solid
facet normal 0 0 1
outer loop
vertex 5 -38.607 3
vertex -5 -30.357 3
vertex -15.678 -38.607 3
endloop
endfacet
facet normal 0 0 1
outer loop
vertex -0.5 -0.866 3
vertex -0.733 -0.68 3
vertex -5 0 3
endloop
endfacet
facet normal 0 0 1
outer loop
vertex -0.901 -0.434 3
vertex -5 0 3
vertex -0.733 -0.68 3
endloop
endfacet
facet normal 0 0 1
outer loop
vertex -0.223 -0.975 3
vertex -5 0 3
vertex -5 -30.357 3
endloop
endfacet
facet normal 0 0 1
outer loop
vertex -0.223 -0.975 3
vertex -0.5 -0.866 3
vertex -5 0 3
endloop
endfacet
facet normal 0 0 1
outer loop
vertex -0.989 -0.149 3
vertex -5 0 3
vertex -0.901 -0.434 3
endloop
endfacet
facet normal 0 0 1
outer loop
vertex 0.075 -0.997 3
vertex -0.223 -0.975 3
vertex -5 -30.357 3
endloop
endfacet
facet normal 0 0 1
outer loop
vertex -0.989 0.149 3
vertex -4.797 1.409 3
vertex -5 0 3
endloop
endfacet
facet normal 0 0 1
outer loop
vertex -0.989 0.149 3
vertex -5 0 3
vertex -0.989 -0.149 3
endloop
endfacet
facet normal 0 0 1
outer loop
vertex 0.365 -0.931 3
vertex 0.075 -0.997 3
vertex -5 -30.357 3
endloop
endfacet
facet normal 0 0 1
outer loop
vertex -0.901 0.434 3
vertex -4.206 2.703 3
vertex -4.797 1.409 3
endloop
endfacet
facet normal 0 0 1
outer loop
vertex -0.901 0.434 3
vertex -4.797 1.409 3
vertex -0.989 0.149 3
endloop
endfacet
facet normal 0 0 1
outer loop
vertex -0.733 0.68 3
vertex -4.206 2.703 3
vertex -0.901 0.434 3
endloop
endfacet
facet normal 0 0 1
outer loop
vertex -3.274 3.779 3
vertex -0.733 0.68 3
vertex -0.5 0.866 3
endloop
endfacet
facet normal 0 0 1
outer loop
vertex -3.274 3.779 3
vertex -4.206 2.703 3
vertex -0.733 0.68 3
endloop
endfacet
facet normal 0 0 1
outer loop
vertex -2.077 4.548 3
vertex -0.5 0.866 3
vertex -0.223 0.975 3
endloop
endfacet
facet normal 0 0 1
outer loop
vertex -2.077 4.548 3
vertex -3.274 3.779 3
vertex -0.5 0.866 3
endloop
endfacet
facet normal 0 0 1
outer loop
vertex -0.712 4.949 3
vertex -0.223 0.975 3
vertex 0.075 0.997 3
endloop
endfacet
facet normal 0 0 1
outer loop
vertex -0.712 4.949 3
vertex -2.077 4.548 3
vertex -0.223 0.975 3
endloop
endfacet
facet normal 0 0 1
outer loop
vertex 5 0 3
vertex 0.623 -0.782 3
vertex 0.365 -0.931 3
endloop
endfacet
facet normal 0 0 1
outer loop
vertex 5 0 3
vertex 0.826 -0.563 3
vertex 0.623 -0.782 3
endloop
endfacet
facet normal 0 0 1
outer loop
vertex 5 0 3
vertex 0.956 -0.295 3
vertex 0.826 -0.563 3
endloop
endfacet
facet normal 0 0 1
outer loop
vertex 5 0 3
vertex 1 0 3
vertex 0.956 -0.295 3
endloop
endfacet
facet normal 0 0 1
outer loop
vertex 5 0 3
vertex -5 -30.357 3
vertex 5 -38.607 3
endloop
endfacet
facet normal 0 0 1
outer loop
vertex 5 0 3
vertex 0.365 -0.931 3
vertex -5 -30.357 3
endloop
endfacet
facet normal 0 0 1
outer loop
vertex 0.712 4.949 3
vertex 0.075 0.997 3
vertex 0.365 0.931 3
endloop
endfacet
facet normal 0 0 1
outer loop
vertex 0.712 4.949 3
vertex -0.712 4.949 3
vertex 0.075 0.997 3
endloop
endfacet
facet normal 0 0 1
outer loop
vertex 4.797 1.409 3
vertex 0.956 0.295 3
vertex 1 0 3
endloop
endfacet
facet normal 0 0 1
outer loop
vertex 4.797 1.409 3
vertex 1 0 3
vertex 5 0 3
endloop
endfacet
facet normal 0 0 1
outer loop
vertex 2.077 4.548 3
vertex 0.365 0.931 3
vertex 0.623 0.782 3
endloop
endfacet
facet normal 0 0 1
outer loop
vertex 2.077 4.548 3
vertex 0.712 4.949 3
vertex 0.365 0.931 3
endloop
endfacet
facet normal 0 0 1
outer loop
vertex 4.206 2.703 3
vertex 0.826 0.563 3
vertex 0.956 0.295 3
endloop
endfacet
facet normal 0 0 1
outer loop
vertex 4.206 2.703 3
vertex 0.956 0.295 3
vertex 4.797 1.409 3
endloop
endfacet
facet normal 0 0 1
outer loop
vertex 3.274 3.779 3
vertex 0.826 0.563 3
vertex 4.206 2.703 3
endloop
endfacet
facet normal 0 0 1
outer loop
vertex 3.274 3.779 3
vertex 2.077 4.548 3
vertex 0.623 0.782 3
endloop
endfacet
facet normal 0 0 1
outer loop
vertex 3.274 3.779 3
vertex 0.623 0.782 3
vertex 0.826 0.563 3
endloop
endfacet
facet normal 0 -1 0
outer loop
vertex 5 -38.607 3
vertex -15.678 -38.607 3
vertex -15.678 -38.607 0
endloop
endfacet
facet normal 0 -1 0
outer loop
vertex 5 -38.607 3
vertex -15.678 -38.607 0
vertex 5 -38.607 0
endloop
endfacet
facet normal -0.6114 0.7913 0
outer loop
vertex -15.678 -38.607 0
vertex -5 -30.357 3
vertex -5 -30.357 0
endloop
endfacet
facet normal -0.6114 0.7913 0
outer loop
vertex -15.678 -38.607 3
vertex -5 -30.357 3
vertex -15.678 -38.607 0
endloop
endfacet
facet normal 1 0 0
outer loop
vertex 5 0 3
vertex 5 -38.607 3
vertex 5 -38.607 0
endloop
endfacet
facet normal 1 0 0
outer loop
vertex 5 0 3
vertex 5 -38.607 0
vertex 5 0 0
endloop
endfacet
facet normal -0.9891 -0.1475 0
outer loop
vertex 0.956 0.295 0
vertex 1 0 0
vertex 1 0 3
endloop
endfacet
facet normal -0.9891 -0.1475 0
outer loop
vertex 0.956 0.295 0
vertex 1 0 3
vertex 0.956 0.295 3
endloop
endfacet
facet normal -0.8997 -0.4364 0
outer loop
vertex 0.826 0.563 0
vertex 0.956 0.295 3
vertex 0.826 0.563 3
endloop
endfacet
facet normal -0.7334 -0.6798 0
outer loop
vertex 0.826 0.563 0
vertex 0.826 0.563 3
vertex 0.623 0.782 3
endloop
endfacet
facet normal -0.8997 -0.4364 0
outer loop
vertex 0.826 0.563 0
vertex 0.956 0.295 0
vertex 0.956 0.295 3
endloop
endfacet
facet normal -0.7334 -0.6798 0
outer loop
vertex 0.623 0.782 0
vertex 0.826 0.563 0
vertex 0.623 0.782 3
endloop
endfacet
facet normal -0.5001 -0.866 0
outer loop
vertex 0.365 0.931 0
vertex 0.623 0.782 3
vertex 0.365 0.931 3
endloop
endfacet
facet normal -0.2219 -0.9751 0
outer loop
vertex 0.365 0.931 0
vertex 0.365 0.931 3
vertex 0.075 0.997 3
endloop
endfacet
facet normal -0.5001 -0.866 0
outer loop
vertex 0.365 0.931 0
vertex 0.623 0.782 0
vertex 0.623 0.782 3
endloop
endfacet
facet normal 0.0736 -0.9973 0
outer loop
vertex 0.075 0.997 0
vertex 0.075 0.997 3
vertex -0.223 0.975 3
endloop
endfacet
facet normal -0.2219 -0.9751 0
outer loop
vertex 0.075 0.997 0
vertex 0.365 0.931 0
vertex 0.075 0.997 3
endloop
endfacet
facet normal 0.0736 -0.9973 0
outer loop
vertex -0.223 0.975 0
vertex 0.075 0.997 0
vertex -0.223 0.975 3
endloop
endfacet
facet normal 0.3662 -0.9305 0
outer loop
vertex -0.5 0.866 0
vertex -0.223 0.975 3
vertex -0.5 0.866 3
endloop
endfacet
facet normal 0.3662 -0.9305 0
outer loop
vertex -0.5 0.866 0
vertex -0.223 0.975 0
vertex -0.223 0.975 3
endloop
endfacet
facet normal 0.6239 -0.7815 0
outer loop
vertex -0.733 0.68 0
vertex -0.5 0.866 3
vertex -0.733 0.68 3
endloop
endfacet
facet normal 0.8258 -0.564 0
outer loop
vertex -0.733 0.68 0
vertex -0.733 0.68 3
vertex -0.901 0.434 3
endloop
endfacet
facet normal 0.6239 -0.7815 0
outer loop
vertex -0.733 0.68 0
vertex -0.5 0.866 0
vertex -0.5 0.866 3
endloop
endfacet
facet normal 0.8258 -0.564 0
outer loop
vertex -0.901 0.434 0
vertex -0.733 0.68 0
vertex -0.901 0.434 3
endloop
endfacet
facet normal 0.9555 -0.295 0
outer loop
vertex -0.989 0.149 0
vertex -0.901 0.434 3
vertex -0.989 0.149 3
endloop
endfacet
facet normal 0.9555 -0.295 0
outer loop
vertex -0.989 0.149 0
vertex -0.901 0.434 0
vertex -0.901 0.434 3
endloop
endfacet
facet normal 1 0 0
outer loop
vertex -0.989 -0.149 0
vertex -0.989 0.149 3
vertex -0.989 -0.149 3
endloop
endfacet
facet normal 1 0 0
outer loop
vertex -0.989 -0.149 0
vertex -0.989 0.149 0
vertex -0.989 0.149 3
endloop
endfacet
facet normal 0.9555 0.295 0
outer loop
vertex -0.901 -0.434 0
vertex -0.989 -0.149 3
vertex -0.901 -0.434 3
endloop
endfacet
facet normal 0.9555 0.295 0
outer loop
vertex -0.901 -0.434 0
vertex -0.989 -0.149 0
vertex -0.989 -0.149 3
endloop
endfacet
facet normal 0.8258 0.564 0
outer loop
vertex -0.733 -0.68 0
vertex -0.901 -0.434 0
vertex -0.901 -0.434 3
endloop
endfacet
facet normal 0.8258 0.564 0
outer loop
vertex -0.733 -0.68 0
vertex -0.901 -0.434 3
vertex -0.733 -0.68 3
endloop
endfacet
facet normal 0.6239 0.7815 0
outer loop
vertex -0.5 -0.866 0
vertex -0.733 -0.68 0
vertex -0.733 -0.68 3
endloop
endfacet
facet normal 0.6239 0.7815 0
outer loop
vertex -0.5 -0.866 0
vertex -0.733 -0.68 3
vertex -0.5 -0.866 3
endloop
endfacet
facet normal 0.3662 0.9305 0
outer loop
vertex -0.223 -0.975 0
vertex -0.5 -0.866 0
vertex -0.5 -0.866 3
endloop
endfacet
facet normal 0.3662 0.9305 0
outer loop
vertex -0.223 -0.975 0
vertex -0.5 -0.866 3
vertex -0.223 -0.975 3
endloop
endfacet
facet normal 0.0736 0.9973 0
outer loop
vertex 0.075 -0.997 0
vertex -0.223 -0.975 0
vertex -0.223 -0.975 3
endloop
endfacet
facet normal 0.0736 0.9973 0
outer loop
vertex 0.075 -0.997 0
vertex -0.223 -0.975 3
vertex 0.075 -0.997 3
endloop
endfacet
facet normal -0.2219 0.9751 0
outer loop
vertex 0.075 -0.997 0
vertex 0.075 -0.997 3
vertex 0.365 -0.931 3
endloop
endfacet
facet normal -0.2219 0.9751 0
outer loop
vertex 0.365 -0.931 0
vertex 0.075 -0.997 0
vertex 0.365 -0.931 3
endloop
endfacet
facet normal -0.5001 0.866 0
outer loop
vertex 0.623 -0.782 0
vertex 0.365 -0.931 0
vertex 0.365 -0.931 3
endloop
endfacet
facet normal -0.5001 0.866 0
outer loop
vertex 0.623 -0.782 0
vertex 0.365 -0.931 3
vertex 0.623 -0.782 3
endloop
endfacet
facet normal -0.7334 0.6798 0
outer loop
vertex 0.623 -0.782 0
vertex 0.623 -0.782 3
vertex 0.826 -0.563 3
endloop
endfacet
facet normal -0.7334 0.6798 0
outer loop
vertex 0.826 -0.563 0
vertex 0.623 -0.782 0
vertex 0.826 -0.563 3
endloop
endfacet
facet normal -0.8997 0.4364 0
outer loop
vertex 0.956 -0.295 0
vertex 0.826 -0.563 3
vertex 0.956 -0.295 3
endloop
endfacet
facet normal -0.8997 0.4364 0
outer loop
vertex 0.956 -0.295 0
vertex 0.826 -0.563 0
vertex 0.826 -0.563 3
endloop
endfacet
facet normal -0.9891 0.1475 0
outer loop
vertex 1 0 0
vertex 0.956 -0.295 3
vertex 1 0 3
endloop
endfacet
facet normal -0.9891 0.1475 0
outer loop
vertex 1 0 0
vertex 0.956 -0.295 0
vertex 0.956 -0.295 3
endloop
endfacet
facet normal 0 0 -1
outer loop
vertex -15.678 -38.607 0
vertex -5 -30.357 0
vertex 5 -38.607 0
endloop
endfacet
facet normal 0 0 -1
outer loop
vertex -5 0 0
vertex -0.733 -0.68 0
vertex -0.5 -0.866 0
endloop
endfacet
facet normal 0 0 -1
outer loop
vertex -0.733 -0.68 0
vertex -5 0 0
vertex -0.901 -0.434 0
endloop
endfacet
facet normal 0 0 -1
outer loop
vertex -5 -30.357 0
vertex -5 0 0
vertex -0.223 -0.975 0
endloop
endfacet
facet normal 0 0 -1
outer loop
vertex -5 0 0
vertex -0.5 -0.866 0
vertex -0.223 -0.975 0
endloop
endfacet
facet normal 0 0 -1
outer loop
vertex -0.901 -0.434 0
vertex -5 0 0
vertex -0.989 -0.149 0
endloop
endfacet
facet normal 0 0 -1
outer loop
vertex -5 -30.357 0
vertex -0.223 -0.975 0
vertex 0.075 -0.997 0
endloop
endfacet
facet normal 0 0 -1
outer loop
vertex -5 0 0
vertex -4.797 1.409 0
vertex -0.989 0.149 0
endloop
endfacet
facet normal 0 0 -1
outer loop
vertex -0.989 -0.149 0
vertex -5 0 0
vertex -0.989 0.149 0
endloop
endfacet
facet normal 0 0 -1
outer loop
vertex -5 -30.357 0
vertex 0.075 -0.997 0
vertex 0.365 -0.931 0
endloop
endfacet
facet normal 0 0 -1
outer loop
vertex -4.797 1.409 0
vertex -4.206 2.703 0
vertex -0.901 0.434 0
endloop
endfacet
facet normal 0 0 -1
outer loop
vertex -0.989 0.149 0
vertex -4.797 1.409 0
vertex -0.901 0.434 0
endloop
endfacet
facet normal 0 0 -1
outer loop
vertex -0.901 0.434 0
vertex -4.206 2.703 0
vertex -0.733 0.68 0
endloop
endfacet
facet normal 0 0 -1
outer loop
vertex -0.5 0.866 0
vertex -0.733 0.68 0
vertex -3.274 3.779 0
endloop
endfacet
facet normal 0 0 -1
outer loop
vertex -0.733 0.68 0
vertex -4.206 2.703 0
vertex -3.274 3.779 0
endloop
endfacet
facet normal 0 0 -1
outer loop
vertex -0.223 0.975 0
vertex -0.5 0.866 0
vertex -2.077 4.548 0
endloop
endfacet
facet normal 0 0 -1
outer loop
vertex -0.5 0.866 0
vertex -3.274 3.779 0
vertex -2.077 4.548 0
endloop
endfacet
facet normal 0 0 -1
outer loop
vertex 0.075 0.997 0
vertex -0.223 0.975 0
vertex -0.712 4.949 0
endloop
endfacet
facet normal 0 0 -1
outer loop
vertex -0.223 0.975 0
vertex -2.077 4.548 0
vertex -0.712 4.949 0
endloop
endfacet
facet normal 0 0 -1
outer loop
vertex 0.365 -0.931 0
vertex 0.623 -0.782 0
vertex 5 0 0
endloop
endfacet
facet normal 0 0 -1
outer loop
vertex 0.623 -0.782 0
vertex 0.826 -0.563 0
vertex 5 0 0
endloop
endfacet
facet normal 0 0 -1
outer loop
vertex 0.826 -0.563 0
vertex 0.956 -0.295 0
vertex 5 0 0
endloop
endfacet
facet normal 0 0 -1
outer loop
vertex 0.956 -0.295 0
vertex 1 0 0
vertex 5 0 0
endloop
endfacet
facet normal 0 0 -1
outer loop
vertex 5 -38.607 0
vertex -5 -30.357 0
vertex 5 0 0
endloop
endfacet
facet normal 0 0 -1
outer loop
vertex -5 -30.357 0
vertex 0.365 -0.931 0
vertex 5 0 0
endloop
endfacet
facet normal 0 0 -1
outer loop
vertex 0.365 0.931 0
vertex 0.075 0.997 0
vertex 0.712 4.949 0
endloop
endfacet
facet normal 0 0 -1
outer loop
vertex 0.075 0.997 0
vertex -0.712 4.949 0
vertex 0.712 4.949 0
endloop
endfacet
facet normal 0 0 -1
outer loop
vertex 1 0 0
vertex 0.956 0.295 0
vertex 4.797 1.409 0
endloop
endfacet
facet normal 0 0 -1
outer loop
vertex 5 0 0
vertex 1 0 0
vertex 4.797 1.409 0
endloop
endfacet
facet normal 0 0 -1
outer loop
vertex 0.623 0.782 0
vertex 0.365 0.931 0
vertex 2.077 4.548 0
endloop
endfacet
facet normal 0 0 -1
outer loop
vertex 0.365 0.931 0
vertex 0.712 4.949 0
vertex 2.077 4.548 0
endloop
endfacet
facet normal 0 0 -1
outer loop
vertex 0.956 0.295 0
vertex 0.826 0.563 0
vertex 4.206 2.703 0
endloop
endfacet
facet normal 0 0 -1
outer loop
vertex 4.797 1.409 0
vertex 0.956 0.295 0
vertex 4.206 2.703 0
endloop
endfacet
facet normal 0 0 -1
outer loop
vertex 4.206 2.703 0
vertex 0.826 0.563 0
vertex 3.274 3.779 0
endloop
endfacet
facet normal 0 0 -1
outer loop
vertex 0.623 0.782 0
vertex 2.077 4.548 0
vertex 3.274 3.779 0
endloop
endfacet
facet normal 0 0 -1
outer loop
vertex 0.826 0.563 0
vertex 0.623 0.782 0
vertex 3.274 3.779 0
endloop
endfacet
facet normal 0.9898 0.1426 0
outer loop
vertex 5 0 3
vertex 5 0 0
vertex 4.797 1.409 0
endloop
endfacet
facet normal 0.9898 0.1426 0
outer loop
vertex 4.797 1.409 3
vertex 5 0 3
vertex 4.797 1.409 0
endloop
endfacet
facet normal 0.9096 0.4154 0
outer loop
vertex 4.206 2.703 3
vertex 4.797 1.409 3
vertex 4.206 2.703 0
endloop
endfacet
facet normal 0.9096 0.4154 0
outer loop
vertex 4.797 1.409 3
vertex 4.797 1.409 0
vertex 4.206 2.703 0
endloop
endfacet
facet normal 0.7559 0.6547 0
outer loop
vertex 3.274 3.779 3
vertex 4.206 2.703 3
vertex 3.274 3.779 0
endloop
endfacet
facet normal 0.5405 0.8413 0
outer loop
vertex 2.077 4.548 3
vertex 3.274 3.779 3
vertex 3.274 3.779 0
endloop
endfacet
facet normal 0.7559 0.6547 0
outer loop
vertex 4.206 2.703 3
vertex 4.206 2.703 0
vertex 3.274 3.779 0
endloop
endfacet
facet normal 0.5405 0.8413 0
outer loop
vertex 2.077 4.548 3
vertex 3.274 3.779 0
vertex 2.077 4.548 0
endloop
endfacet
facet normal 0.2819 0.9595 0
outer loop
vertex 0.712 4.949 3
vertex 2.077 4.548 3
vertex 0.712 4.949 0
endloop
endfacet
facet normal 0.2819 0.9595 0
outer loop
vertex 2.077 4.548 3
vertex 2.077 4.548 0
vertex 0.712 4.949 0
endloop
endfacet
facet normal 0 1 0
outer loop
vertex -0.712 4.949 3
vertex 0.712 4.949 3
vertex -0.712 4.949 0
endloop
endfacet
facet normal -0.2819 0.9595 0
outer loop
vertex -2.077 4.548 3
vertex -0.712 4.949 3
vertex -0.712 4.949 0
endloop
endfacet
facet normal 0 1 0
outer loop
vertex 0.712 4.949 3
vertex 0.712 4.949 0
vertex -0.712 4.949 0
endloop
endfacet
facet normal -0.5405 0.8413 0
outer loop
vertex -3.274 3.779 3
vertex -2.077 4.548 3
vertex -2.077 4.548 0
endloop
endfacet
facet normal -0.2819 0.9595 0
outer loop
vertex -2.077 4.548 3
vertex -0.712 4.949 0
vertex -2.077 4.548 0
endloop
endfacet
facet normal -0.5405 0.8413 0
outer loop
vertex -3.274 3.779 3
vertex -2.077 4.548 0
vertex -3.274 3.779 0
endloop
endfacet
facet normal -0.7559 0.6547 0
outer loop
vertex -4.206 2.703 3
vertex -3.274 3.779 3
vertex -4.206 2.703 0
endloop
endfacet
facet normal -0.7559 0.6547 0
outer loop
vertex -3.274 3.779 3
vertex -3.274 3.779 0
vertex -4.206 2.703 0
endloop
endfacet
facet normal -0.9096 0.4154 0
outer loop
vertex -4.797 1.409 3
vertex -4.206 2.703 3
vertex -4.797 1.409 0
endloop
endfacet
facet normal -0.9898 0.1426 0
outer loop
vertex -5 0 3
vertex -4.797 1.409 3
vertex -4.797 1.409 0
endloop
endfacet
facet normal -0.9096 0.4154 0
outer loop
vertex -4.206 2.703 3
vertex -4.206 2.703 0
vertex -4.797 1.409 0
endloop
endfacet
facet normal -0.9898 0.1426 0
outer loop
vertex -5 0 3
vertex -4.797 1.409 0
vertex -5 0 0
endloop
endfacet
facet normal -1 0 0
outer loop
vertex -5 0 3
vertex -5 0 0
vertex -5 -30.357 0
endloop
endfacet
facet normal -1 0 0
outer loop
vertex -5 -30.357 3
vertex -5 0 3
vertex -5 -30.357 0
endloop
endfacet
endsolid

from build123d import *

# Parameters (mm, degrees)
SKETCH_1_R      = 1
EXTRUDE_1_DEPTH = 3
EXTRUDE_2_DEPTH = 3


with BuildPart() as part:
    # 草图1 → 凸台-拉伸1 (new body)
    with BuildSketch(Plane.XY):
        with BuildLine():
            Line((-5, 0), (-5, -30.357146931))
            Line((-5, -30.357146931), (5, -30.357146931))
            Line((5, -30.357146931), (5, 0))
            ThreePointArc((5, 0), (0, 5), (-5, 0))
        make_face()
        Circle(SKETCH_1_R, mode=Mode.SUBTRACT)
    extrude(amount=EXTRUDE_1_DEPTH)

    # 草图2 → 凸台-拉伸2 (add)
    with BuildSketch(Plane.XY.offset(3)):
        Polygon((-15.678069464, -38.606948739), (5, -38.606948739), (5, -35.668972407), (5, -30.357146931), (-5, -30.357146931), align=None)
    extrude(amount=-EXTRUDE_2_DEPTH)


solid = part.part
